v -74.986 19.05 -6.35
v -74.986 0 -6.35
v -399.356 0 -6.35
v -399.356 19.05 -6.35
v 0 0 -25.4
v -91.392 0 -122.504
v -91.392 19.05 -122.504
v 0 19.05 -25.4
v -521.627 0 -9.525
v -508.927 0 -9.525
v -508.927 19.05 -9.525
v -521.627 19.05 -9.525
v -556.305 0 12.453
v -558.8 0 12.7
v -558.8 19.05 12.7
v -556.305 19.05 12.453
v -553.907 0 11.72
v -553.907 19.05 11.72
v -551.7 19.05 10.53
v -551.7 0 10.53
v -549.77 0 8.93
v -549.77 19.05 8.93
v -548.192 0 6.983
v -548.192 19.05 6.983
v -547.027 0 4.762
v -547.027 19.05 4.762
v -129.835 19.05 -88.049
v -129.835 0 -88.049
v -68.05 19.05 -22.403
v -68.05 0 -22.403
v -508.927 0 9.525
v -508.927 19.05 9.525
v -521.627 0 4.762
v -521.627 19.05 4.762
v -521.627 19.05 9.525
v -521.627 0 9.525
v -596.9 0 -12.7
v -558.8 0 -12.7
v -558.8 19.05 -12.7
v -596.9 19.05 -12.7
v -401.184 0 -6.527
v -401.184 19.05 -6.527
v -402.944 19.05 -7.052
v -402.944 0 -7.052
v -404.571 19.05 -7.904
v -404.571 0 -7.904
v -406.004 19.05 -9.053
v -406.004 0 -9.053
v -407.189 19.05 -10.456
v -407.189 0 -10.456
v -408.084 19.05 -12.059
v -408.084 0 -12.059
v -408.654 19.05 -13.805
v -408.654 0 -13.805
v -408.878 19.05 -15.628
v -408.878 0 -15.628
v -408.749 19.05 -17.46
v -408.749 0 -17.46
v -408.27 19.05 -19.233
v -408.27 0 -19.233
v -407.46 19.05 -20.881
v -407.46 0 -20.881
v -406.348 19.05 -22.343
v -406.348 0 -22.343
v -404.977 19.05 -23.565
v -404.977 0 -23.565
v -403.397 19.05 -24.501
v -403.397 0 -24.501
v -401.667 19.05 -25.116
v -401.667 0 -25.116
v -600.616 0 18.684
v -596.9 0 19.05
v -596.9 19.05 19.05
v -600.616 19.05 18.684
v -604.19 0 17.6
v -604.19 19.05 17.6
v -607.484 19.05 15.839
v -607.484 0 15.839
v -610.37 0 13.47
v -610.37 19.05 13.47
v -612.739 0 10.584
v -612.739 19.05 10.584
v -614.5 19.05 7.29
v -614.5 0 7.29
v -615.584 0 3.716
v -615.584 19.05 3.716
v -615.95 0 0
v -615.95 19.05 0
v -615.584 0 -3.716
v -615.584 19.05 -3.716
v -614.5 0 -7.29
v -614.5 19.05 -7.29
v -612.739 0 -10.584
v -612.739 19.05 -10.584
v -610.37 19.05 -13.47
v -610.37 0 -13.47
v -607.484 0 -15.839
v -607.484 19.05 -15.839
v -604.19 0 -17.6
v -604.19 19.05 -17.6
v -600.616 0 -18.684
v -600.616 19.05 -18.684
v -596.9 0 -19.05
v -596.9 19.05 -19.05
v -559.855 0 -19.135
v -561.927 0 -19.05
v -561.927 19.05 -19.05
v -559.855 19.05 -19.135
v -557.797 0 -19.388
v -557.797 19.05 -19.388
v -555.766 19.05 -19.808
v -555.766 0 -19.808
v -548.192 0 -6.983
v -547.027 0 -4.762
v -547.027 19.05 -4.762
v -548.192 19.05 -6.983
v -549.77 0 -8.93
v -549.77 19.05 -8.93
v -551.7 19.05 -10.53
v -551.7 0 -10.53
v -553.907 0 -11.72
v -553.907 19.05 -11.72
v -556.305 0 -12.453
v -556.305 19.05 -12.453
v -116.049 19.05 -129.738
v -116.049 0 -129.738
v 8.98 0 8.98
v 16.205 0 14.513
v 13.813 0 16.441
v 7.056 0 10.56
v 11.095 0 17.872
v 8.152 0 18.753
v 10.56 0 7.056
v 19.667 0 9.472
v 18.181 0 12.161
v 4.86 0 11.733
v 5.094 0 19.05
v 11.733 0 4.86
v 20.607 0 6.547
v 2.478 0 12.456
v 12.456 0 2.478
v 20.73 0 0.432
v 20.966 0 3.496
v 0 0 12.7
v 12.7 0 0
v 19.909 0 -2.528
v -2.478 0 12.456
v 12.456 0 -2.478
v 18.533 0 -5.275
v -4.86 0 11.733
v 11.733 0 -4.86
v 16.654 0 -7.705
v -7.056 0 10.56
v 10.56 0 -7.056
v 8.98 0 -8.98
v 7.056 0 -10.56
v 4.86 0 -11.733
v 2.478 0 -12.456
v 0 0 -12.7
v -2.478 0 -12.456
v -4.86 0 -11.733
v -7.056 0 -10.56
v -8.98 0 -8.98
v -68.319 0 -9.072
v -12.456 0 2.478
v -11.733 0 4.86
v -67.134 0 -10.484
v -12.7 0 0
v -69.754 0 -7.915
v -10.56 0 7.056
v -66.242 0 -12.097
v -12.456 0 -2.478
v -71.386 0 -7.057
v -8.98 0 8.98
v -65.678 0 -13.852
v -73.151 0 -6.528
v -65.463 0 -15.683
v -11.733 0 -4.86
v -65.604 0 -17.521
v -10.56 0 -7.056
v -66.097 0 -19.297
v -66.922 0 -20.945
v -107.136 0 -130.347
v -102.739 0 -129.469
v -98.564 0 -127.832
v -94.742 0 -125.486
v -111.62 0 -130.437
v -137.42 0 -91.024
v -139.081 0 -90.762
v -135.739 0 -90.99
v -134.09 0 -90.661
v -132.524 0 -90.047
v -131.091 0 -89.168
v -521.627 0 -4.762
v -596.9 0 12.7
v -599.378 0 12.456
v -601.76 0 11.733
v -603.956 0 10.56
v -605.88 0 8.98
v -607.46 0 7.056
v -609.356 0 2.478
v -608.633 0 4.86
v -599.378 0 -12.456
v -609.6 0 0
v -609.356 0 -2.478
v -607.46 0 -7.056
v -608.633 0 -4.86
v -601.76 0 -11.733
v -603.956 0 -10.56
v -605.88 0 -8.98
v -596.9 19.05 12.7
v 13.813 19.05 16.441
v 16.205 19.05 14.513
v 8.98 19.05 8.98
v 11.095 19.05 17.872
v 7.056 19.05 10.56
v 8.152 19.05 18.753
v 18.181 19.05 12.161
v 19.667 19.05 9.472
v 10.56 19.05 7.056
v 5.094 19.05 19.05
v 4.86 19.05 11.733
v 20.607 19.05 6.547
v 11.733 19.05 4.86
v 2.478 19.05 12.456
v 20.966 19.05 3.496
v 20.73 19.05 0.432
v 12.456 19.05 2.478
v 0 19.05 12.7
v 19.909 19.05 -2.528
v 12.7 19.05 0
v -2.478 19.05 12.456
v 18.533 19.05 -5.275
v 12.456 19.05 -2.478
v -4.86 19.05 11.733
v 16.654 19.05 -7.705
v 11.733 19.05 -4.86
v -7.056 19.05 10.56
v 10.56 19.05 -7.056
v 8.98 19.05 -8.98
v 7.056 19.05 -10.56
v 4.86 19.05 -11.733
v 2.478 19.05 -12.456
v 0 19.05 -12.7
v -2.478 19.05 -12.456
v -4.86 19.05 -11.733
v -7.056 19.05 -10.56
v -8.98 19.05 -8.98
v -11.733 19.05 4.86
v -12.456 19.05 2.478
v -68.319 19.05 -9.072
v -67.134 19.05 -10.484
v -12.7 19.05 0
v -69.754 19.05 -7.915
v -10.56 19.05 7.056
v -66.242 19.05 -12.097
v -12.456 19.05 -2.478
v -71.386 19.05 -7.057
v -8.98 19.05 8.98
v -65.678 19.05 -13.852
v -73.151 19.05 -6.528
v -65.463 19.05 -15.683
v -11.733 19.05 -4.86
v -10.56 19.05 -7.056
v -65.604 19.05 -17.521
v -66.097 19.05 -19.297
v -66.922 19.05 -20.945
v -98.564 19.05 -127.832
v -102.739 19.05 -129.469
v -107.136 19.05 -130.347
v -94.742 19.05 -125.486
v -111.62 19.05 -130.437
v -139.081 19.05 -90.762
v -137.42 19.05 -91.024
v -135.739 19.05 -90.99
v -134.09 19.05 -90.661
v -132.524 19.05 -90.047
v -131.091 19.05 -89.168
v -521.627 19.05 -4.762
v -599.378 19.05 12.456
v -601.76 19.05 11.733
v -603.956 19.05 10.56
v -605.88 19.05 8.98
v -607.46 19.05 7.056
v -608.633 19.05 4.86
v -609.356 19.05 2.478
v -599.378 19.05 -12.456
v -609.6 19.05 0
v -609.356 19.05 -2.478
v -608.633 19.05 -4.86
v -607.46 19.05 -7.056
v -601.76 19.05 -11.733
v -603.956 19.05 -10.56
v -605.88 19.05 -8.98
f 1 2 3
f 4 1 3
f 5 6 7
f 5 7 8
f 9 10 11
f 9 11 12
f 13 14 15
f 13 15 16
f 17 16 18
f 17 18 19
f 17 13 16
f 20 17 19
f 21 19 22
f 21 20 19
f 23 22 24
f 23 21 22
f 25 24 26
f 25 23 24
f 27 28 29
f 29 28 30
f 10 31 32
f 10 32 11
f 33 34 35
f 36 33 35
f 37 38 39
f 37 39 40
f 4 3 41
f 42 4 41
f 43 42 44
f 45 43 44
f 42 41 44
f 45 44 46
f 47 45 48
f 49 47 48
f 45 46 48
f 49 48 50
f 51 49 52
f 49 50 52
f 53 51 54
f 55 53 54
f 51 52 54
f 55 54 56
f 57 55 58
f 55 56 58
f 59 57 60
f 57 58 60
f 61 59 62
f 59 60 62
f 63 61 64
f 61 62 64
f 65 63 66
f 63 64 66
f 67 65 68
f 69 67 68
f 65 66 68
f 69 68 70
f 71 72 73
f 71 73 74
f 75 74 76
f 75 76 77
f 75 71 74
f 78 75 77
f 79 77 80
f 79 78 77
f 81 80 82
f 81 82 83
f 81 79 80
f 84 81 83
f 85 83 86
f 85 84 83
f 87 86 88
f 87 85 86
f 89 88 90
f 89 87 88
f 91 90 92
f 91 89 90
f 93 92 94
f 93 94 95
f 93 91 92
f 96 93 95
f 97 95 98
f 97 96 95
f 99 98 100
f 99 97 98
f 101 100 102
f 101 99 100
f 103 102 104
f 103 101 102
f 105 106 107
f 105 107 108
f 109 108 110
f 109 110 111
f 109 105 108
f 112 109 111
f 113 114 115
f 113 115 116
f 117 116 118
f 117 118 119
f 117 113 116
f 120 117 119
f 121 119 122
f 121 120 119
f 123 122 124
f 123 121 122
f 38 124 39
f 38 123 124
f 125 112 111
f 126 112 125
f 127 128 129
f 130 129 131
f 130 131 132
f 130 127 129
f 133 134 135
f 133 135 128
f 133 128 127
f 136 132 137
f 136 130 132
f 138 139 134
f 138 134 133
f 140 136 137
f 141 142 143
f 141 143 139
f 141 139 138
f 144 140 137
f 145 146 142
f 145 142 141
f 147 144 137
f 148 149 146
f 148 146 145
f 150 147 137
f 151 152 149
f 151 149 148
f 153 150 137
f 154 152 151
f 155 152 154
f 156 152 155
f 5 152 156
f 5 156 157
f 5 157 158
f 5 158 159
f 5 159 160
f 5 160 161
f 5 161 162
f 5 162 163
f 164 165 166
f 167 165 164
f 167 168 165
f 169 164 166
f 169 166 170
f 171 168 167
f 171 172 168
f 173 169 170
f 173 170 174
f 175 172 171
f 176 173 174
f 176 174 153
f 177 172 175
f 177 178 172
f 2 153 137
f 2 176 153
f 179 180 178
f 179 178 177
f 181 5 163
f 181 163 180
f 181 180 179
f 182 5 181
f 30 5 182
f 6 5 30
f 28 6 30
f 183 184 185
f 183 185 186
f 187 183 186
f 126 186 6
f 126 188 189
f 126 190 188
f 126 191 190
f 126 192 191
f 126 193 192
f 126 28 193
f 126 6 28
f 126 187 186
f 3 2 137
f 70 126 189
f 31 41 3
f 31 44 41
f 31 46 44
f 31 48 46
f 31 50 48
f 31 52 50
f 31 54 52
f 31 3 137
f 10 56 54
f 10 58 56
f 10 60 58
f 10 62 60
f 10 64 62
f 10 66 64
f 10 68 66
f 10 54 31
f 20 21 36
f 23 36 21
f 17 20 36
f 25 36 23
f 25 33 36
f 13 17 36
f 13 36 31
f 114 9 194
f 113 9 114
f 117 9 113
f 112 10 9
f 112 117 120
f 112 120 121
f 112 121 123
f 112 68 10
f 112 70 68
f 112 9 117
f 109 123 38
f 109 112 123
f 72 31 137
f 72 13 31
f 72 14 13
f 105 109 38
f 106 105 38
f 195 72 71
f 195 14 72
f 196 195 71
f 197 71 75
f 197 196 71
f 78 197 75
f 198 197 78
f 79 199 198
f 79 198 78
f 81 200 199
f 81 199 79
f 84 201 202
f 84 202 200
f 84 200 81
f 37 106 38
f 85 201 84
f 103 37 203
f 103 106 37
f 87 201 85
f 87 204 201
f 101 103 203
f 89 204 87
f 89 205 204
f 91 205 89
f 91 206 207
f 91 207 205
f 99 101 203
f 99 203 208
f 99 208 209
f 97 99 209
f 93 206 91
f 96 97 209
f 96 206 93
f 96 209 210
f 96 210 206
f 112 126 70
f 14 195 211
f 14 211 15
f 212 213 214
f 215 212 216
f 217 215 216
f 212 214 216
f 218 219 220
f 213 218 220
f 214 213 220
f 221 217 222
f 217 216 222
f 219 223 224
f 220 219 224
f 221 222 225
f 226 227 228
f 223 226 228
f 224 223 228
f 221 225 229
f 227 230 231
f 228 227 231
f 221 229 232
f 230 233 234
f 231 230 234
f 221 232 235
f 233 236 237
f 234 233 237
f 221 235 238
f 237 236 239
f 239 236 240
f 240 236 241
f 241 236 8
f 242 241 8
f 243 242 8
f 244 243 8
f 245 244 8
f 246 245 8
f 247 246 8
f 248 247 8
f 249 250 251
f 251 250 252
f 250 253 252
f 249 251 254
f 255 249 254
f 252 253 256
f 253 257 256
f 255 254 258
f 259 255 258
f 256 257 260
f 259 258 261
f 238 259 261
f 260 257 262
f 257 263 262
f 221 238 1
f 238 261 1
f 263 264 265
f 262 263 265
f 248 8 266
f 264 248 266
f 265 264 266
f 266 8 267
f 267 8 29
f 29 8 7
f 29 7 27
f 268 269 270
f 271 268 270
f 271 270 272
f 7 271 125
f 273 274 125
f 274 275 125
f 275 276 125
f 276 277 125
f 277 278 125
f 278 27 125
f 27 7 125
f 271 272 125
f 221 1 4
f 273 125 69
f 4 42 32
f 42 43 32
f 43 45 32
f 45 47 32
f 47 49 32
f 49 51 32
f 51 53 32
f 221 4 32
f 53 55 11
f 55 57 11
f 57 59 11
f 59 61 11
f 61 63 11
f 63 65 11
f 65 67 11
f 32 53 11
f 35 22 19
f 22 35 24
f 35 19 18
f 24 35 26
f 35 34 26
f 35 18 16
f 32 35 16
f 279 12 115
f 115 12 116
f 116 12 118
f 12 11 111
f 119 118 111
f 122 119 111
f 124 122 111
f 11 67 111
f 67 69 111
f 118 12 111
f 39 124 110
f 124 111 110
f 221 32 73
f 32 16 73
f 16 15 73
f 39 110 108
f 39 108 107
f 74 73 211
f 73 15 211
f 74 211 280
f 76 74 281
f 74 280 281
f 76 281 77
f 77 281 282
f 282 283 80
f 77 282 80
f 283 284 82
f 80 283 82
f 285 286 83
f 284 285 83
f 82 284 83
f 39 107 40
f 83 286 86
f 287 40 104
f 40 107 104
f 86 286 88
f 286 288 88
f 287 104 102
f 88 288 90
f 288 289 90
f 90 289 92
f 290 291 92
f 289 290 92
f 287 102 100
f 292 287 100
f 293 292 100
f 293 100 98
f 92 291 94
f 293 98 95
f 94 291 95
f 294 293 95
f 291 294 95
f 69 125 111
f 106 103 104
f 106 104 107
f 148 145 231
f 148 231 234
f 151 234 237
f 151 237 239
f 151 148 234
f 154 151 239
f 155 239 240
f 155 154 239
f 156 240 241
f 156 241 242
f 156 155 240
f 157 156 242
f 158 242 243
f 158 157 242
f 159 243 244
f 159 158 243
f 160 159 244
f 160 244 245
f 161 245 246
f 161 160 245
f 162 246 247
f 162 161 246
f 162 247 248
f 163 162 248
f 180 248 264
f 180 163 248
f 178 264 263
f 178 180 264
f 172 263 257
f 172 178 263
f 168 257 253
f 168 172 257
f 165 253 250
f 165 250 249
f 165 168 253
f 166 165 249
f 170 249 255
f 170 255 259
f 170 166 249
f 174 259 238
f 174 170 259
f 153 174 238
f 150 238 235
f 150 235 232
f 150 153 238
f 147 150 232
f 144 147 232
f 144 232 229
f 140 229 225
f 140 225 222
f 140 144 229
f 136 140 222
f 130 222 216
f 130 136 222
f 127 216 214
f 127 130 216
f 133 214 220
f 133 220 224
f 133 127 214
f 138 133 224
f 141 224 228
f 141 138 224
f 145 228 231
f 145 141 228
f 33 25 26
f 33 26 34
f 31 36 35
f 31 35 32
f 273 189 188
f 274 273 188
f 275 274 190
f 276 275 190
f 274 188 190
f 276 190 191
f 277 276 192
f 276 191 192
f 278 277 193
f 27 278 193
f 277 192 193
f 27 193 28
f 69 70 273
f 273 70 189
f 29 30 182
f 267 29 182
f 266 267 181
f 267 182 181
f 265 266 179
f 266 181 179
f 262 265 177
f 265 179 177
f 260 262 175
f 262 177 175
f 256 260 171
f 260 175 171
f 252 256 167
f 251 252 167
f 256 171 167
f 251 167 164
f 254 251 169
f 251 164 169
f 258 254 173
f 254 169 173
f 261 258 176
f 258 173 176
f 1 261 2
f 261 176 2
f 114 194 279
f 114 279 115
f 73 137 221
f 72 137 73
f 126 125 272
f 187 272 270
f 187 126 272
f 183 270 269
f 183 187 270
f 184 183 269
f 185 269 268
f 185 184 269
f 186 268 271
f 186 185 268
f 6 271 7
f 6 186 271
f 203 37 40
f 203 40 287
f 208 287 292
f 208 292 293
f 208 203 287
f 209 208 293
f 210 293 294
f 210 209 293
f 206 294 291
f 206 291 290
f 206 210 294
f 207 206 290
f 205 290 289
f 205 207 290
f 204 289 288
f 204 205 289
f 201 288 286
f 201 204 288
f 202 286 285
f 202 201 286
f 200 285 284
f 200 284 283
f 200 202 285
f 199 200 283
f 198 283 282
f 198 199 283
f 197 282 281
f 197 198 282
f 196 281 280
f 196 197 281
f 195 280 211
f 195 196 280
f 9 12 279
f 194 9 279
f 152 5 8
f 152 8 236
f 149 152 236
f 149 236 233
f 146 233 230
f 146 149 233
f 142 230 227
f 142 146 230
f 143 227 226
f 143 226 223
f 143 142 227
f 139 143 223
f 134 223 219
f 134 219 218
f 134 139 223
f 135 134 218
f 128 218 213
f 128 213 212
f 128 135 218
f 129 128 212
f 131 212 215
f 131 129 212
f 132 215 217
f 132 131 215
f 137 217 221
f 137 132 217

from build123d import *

# Parameters (mm, degrees)
SKETCH1_R           = 12.7
BOSS_EXTRUDE1_DEPTH = 19.05


with BuildPart() as part:
    # Sketch1 → Boss-Extrude1 (new body)
    with BuildSketch(Plane(origin=(0, 0, 0), x_dir=(1, 0, 0), z_dir=(0, 1, 0))):
        with BuildLine():
            Line((0, -19.05), (-558.8, -19.05))
            Line((-558.8, -19.05), (-596.9, -19.05))
            ThreePointArc((-596.9, -19.05), (-615.95, 0), (-596.9, 19.05))
            Line((-596.9, 19.05), (-561.926882891, 19.05))
            ThreePointArc((-561.926882891, 19.05), (-558.823427993, 19.24030806), (-555.766478015, 19.808380496))
            Line((-555.766478015, 19.808380496), (-116.049044826, 129.737738793))
            ThreePointArc((-116.049044826, 129.737738793), (-102.738548138, 129.468976879), (-91.392360136, 122.504382644))
            Line((-91.392360136, 122.504382644), (0, 25.4))
            Line((0, 25.4), (16.653962733, 7.705164597))
            ThreePointArc((16.653962733, 7.705164597), (19.666677712, -9.47154715), (5.093787849, -19.05))
            Line((5.093787849, -19.05), (0, -19.05))
        make_face()
        Circle(SKETCH1_R, mode=Mode.SUBTRACT)
        with BuildLine():
            Line((-596.9, -12.7), (-558.8, -12.7))
            ThreePointArc((-558.8, -12.7), (-551.700484171, -10.530283709), (-547.026784902, -4.7625))
            Line((-547.026784902, -4.7625), (-521.626784902, -4.7625))
            Line((-521.626784902, -4.7625), (-521.626784902, -9.525))
            Line((-521.626784902, -9.525), (-508.926784902, -9.525))
            Line((-508.926784902, -9.525), (-508.926784902, 9.525))
            Line((-508.926784902, 9.525), (-521.626784902, 9.525))
            Line((-521.626784902, 9.525), (-521.626784902, 4.7625))
            Line((-521.626784902, 4.7625), (-547.026784902, 4.7625))
            ThreePointArc((-547.026784902, 4.7625), (-551.700484171, 10.530283709), (-558.8, 12.7))
            Line((-558.8, 12.7), (-596.9, 12.7))
            ThreePointArc((-596.9, 12.7), (-609.6, 0), (-596.9, -12.7))
        make_face(mode=Mode.SUBTRACT)
        with BuildLine():
            Line((-401.666524357, 25.115607314), (-139.08105489, 90.761974681))
            ThreePointArc((-139.08105489, 90.761974681), (-134.089618632, 90.661188963), (-129.834798131, 88.049466125))
            Line((-129.834798131, 88.049466125), (-68.049981786, 22.403098758))
            ThreePointArc((-68.049981786, 22.403098758), (-66.242352798, 12.09707171), (-74.986086716, 6.35))
            Line((-74.986086716, 6.35), (-399.356372528, 6.35))
            ThreePointArc((-399.356372528, 6.35), (-408.810007006, 14.711204413), (-401.666524357, 25.115607314))
        make_face(mode=Mode.SUBTRACT)
    extrude(amount=BOSS_EXTRUDE1_DEPTH)


solid = part.part
